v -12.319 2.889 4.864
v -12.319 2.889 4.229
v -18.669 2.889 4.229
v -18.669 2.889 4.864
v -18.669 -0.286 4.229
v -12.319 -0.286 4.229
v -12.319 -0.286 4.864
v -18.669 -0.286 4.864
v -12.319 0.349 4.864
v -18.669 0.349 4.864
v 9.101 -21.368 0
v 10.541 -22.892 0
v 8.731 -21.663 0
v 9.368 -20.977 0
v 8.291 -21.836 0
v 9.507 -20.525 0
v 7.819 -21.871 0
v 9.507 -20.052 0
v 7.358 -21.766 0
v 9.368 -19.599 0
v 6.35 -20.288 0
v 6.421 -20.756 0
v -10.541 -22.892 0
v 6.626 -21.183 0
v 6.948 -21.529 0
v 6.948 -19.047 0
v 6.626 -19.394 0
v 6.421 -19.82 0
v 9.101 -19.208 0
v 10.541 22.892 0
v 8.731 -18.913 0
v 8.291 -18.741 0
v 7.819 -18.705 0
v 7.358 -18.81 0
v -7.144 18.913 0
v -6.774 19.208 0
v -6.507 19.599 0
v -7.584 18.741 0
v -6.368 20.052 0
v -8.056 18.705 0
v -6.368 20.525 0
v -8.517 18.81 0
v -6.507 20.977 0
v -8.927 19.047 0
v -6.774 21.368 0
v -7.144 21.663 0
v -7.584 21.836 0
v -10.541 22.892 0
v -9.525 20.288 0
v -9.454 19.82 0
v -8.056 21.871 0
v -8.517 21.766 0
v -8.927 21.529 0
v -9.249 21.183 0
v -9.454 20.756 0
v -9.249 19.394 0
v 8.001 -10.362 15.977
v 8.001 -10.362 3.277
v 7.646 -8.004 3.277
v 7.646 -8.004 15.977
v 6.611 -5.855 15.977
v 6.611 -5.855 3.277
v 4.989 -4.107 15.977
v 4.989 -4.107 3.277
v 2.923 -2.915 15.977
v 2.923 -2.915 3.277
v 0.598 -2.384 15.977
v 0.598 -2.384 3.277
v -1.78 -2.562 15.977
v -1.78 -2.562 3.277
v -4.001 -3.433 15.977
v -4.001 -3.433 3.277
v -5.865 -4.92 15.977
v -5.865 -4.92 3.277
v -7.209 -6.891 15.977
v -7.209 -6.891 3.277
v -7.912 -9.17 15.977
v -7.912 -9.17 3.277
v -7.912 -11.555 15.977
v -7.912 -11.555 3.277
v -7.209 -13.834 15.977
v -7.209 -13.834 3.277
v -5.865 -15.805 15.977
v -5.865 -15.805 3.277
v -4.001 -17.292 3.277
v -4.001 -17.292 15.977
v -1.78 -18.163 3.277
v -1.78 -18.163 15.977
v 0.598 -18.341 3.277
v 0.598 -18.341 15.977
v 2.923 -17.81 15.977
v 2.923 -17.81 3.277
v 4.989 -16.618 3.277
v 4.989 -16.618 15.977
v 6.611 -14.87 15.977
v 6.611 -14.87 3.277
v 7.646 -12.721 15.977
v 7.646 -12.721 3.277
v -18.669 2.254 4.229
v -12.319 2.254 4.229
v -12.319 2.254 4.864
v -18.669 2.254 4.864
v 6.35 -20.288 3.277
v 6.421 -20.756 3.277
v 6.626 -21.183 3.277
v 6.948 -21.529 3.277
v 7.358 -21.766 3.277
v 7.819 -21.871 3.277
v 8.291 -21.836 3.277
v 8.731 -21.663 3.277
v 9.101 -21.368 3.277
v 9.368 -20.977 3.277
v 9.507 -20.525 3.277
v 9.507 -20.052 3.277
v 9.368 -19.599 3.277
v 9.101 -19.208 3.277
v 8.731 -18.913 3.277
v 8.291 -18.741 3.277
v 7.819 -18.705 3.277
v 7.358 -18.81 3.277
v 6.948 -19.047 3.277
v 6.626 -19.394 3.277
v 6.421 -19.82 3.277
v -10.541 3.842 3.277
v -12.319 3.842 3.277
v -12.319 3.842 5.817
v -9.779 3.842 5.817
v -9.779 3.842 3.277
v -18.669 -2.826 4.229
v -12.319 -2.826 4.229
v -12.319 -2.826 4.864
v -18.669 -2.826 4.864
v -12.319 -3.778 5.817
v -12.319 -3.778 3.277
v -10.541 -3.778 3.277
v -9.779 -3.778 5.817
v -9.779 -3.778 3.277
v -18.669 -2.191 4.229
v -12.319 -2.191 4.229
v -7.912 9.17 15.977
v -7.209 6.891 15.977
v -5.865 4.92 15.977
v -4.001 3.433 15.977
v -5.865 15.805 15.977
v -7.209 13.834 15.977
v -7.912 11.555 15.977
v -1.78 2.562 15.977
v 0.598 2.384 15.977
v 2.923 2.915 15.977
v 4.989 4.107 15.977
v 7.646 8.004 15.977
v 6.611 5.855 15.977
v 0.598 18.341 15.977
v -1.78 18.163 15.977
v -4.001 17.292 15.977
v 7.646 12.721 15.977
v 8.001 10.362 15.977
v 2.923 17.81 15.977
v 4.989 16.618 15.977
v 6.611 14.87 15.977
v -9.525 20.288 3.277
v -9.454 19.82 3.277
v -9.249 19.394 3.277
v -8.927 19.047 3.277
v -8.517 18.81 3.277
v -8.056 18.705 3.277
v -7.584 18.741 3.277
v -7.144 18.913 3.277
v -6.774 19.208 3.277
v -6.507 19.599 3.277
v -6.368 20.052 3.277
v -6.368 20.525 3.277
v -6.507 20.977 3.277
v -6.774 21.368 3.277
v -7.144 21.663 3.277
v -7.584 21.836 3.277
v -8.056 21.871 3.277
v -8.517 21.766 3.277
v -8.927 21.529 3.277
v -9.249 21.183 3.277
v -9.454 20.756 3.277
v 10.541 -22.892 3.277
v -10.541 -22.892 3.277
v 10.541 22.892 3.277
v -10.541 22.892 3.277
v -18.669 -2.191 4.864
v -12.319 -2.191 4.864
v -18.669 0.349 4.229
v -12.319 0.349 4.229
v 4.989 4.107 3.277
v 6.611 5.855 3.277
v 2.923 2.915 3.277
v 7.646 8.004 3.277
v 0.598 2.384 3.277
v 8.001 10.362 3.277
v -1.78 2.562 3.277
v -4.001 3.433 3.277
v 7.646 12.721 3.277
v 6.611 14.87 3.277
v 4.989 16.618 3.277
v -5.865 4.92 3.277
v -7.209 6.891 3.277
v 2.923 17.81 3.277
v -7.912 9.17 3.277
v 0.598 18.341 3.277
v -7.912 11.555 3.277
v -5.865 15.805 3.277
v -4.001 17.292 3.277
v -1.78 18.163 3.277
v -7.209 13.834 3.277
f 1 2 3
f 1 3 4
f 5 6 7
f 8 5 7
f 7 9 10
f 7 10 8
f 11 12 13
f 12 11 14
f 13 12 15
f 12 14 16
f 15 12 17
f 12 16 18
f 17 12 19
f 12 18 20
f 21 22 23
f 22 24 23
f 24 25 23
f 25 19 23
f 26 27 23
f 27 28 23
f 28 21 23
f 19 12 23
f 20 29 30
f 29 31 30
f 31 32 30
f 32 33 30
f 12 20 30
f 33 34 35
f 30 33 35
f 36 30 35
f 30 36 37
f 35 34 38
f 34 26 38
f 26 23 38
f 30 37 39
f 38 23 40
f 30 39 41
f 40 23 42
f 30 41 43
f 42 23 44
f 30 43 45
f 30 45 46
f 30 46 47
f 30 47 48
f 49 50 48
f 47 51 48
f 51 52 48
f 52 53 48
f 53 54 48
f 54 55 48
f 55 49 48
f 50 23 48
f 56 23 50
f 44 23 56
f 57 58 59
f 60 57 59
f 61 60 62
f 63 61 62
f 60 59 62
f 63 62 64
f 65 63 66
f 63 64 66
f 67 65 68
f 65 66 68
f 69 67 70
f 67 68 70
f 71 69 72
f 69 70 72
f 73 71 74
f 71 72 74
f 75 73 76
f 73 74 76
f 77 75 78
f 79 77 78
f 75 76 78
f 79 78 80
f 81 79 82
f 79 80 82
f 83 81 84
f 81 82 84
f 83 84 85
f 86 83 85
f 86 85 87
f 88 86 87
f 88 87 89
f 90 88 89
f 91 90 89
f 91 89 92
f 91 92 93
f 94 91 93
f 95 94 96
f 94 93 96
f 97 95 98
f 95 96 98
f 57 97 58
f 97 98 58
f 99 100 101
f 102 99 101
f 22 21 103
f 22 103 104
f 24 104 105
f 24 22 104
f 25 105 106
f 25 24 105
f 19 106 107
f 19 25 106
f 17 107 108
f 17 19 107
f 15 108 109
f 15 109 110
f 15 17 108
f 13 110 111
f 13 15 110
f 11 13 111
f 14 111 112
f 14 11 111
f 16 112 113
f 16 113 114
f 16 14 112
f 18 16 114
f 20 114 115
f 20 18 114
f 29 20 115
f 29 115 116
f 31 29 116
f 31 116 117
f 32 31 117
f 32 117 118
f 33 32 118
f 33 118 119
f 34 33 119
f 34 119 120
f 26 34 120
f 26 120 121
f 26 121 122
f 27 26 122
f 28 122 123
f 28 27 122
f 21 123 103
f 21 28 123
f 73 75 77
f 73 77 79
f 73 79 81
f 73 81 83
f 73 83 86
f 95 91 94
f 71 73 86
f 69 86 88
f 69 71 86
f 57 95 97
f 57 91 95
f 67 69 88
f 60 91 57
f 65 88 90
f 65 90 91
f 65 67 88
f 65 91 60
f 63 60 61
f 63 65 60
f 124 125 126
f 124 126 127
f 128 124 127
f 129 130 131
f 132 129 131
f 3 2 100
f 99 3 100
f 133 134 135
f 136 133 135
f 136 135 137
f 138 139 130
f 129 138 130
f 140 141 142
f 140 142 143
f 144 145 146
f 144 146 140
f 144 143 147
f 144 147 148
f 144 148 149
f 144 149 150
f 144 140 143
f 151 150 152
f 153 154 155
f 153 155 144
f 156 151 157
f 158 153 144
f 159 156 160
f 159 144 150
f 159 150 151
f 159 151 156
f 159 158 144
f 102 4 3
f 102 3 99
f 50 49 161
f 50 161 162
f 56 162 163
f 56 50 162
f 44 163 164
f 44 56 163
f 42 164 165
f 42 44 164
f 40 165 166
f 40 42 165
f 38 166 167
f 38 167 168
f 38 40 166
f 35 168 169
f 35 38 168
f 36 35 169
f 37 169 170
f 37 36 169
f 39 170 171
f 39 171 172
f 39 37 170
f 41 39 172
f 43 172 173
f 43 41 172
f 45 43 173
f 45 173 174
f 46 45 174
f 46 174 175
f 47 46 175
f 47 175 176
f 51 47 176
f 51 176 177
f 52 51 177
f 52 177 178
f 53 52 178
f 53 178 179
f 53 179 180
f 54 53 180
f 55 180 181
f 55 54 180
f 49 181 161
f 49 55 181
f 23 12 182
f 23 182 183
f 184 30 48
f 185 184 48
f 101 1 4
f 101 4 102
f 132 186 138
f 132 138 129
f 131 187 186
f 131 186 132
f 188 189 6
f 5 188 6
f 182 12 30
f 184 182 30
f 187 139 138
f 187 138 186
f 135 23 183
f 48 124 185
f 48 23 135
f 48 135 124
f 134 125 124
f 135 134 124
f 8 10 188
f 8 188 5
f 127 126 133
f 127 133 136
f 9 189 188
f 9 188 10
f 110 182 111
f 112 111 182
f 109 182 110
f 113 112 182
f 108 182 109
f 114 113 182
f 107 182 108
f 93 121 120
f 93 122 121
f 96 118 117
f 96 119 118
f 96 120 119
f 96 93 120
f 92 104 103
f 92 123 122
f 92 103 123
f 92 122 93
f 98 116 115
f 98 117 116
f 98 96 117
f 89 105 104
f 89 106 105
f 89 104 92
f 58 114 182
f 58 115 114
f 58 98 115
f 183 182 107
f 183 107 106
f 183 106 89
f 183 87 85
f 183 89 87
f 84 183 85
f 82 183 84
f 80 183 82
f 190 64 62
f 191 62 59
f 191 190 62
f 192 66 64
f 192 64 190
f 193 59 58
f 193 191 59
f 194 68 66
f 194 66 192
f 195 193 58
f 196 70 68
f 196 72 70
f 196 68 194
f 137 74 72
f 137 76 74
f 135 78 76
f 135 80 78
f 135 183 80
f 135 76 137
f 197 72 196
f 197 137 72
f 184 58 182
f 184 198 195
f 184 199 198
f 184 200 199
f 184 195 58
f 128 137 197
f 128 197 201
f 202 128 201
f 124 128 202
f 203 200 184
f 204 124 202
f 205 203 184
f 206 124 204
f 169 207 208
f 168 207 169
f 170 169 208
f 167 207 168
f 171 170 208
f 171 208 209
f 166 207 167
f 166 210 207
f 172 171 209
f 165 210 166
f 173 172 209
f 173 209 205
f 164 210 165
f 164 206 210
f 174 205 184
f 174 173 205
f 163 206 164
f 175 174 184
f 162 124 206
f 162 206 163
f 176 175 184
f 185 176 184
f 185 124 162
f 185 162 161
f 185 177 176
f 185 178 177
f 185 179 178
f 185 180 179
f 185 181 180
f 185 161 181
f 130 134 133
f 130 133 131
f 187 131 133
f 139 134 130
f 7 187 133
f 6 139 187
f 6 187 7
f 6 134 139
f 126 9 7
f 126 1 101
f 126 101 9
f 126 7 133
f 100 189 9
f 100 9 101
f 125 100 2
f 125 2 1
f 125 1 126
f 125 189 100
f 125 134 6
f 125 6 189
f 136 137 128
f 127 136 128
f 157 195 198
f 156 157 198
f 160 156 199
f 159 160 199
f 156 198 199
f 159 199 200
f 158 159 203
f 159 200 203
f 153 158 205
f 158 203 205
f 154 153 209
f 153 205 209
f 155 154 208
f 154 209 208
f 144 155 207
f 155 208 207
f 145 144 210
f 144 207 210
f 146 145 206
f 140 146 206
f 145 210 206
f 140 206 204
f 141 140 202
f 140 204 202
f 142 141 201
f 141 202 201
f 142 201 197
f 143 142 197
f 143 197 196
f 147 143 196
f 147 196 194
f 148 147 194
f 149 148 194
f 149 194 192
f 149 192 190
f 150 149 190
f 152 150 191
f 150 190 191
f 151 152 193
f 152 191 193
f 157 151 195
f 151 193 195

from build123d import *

# Parameters (mm, degrees)
SKETCH1_W           = 45.7835
SKETCH1_H           = 21.082
SKETCH1_R           = 1.5875
BOSS_EXTRUDE1_DEPTH = 3.2766
SKETCH2_R           = 8.001
BOSS_EXTRUDE2_DEPTH = 12.7
SKETCH3_W           = 2.54
SKETCH3_H           = 7.62
BOSS_EXTRUDE3_DEPTH = 2.54
SKETCH4_W           = 0.635
SKETCH4_H           = 0.635
BOSS_EXTRUDE4_DEPTH = 6.35


with BuildPart() as part:
    # Sketch1 → Boss-Extrude1 (new body)
    with BuildSketch(Plane(origin=(0, 0, 0), x_dir=(0, 1, 0), z_dir=(0, 0, 1))):
        Rectangle(SKETCH1_W, SKETCH1_H)
        with Locations(Location((-20.28825, -7.9375, 0), (0, 0, 90))):
            Circle(SKETCH1_R, mode=Mode.SUBTRACT)
        with Locations(Location((20.28825, 7.9375, 0), (0, 0, 90))):
            Circle(SKETCH1_R, mode=Mode.SUBTRACT)
    extrude(amount=BOSS_EXTRUDE1_DEPTH)

    # Sketch2 → Boss-Extrude2 (add)
    with BuildSketch(Plane.XY.offset(3.2766)):
        with Locations((0, 10.362469871)):
            Circle(SKETCH2_R)
        with Locations((0, -10.362469871)):
            Circle(SKETCH2_R)
    extrude(amount=BOSS_EXTRUDE2_DEPTH)

    # Sketch3 → Boss-Extrude3 (add)
    with BuildSketch(Plane.XY.offset(3.2766)):
        with Locations((-11.049, 0.03175)):
            Rectangle(SKETCH3_W, SKETCH3_H)
    extrude(amount=BOSS_EXTRUDE3_DEPTH)

    # Sketch4 → Boss-Extrude4 (add)
    with BuildSketch(Plane(origin=(-12.319, 0, 0), x_dir=(0, -1, 0), z_dir=(-1, 0, 0))):
        with Locations((2.50825, 4.5466)):
            Rectangle(SKETCH4_W, SKETCH4_H)
        with Locations((-0.03175, 4.5466)):
            Rectangle(SKETCH4_W, SKETCH4_H)
        with Locations((-2.57175, 4.5466)):
            Rectangle(SKETCH4_W, SKETCH4_H)
    extrude(amount=BOSS_EXTRUDE4_DEPTH)


solid = part.part
